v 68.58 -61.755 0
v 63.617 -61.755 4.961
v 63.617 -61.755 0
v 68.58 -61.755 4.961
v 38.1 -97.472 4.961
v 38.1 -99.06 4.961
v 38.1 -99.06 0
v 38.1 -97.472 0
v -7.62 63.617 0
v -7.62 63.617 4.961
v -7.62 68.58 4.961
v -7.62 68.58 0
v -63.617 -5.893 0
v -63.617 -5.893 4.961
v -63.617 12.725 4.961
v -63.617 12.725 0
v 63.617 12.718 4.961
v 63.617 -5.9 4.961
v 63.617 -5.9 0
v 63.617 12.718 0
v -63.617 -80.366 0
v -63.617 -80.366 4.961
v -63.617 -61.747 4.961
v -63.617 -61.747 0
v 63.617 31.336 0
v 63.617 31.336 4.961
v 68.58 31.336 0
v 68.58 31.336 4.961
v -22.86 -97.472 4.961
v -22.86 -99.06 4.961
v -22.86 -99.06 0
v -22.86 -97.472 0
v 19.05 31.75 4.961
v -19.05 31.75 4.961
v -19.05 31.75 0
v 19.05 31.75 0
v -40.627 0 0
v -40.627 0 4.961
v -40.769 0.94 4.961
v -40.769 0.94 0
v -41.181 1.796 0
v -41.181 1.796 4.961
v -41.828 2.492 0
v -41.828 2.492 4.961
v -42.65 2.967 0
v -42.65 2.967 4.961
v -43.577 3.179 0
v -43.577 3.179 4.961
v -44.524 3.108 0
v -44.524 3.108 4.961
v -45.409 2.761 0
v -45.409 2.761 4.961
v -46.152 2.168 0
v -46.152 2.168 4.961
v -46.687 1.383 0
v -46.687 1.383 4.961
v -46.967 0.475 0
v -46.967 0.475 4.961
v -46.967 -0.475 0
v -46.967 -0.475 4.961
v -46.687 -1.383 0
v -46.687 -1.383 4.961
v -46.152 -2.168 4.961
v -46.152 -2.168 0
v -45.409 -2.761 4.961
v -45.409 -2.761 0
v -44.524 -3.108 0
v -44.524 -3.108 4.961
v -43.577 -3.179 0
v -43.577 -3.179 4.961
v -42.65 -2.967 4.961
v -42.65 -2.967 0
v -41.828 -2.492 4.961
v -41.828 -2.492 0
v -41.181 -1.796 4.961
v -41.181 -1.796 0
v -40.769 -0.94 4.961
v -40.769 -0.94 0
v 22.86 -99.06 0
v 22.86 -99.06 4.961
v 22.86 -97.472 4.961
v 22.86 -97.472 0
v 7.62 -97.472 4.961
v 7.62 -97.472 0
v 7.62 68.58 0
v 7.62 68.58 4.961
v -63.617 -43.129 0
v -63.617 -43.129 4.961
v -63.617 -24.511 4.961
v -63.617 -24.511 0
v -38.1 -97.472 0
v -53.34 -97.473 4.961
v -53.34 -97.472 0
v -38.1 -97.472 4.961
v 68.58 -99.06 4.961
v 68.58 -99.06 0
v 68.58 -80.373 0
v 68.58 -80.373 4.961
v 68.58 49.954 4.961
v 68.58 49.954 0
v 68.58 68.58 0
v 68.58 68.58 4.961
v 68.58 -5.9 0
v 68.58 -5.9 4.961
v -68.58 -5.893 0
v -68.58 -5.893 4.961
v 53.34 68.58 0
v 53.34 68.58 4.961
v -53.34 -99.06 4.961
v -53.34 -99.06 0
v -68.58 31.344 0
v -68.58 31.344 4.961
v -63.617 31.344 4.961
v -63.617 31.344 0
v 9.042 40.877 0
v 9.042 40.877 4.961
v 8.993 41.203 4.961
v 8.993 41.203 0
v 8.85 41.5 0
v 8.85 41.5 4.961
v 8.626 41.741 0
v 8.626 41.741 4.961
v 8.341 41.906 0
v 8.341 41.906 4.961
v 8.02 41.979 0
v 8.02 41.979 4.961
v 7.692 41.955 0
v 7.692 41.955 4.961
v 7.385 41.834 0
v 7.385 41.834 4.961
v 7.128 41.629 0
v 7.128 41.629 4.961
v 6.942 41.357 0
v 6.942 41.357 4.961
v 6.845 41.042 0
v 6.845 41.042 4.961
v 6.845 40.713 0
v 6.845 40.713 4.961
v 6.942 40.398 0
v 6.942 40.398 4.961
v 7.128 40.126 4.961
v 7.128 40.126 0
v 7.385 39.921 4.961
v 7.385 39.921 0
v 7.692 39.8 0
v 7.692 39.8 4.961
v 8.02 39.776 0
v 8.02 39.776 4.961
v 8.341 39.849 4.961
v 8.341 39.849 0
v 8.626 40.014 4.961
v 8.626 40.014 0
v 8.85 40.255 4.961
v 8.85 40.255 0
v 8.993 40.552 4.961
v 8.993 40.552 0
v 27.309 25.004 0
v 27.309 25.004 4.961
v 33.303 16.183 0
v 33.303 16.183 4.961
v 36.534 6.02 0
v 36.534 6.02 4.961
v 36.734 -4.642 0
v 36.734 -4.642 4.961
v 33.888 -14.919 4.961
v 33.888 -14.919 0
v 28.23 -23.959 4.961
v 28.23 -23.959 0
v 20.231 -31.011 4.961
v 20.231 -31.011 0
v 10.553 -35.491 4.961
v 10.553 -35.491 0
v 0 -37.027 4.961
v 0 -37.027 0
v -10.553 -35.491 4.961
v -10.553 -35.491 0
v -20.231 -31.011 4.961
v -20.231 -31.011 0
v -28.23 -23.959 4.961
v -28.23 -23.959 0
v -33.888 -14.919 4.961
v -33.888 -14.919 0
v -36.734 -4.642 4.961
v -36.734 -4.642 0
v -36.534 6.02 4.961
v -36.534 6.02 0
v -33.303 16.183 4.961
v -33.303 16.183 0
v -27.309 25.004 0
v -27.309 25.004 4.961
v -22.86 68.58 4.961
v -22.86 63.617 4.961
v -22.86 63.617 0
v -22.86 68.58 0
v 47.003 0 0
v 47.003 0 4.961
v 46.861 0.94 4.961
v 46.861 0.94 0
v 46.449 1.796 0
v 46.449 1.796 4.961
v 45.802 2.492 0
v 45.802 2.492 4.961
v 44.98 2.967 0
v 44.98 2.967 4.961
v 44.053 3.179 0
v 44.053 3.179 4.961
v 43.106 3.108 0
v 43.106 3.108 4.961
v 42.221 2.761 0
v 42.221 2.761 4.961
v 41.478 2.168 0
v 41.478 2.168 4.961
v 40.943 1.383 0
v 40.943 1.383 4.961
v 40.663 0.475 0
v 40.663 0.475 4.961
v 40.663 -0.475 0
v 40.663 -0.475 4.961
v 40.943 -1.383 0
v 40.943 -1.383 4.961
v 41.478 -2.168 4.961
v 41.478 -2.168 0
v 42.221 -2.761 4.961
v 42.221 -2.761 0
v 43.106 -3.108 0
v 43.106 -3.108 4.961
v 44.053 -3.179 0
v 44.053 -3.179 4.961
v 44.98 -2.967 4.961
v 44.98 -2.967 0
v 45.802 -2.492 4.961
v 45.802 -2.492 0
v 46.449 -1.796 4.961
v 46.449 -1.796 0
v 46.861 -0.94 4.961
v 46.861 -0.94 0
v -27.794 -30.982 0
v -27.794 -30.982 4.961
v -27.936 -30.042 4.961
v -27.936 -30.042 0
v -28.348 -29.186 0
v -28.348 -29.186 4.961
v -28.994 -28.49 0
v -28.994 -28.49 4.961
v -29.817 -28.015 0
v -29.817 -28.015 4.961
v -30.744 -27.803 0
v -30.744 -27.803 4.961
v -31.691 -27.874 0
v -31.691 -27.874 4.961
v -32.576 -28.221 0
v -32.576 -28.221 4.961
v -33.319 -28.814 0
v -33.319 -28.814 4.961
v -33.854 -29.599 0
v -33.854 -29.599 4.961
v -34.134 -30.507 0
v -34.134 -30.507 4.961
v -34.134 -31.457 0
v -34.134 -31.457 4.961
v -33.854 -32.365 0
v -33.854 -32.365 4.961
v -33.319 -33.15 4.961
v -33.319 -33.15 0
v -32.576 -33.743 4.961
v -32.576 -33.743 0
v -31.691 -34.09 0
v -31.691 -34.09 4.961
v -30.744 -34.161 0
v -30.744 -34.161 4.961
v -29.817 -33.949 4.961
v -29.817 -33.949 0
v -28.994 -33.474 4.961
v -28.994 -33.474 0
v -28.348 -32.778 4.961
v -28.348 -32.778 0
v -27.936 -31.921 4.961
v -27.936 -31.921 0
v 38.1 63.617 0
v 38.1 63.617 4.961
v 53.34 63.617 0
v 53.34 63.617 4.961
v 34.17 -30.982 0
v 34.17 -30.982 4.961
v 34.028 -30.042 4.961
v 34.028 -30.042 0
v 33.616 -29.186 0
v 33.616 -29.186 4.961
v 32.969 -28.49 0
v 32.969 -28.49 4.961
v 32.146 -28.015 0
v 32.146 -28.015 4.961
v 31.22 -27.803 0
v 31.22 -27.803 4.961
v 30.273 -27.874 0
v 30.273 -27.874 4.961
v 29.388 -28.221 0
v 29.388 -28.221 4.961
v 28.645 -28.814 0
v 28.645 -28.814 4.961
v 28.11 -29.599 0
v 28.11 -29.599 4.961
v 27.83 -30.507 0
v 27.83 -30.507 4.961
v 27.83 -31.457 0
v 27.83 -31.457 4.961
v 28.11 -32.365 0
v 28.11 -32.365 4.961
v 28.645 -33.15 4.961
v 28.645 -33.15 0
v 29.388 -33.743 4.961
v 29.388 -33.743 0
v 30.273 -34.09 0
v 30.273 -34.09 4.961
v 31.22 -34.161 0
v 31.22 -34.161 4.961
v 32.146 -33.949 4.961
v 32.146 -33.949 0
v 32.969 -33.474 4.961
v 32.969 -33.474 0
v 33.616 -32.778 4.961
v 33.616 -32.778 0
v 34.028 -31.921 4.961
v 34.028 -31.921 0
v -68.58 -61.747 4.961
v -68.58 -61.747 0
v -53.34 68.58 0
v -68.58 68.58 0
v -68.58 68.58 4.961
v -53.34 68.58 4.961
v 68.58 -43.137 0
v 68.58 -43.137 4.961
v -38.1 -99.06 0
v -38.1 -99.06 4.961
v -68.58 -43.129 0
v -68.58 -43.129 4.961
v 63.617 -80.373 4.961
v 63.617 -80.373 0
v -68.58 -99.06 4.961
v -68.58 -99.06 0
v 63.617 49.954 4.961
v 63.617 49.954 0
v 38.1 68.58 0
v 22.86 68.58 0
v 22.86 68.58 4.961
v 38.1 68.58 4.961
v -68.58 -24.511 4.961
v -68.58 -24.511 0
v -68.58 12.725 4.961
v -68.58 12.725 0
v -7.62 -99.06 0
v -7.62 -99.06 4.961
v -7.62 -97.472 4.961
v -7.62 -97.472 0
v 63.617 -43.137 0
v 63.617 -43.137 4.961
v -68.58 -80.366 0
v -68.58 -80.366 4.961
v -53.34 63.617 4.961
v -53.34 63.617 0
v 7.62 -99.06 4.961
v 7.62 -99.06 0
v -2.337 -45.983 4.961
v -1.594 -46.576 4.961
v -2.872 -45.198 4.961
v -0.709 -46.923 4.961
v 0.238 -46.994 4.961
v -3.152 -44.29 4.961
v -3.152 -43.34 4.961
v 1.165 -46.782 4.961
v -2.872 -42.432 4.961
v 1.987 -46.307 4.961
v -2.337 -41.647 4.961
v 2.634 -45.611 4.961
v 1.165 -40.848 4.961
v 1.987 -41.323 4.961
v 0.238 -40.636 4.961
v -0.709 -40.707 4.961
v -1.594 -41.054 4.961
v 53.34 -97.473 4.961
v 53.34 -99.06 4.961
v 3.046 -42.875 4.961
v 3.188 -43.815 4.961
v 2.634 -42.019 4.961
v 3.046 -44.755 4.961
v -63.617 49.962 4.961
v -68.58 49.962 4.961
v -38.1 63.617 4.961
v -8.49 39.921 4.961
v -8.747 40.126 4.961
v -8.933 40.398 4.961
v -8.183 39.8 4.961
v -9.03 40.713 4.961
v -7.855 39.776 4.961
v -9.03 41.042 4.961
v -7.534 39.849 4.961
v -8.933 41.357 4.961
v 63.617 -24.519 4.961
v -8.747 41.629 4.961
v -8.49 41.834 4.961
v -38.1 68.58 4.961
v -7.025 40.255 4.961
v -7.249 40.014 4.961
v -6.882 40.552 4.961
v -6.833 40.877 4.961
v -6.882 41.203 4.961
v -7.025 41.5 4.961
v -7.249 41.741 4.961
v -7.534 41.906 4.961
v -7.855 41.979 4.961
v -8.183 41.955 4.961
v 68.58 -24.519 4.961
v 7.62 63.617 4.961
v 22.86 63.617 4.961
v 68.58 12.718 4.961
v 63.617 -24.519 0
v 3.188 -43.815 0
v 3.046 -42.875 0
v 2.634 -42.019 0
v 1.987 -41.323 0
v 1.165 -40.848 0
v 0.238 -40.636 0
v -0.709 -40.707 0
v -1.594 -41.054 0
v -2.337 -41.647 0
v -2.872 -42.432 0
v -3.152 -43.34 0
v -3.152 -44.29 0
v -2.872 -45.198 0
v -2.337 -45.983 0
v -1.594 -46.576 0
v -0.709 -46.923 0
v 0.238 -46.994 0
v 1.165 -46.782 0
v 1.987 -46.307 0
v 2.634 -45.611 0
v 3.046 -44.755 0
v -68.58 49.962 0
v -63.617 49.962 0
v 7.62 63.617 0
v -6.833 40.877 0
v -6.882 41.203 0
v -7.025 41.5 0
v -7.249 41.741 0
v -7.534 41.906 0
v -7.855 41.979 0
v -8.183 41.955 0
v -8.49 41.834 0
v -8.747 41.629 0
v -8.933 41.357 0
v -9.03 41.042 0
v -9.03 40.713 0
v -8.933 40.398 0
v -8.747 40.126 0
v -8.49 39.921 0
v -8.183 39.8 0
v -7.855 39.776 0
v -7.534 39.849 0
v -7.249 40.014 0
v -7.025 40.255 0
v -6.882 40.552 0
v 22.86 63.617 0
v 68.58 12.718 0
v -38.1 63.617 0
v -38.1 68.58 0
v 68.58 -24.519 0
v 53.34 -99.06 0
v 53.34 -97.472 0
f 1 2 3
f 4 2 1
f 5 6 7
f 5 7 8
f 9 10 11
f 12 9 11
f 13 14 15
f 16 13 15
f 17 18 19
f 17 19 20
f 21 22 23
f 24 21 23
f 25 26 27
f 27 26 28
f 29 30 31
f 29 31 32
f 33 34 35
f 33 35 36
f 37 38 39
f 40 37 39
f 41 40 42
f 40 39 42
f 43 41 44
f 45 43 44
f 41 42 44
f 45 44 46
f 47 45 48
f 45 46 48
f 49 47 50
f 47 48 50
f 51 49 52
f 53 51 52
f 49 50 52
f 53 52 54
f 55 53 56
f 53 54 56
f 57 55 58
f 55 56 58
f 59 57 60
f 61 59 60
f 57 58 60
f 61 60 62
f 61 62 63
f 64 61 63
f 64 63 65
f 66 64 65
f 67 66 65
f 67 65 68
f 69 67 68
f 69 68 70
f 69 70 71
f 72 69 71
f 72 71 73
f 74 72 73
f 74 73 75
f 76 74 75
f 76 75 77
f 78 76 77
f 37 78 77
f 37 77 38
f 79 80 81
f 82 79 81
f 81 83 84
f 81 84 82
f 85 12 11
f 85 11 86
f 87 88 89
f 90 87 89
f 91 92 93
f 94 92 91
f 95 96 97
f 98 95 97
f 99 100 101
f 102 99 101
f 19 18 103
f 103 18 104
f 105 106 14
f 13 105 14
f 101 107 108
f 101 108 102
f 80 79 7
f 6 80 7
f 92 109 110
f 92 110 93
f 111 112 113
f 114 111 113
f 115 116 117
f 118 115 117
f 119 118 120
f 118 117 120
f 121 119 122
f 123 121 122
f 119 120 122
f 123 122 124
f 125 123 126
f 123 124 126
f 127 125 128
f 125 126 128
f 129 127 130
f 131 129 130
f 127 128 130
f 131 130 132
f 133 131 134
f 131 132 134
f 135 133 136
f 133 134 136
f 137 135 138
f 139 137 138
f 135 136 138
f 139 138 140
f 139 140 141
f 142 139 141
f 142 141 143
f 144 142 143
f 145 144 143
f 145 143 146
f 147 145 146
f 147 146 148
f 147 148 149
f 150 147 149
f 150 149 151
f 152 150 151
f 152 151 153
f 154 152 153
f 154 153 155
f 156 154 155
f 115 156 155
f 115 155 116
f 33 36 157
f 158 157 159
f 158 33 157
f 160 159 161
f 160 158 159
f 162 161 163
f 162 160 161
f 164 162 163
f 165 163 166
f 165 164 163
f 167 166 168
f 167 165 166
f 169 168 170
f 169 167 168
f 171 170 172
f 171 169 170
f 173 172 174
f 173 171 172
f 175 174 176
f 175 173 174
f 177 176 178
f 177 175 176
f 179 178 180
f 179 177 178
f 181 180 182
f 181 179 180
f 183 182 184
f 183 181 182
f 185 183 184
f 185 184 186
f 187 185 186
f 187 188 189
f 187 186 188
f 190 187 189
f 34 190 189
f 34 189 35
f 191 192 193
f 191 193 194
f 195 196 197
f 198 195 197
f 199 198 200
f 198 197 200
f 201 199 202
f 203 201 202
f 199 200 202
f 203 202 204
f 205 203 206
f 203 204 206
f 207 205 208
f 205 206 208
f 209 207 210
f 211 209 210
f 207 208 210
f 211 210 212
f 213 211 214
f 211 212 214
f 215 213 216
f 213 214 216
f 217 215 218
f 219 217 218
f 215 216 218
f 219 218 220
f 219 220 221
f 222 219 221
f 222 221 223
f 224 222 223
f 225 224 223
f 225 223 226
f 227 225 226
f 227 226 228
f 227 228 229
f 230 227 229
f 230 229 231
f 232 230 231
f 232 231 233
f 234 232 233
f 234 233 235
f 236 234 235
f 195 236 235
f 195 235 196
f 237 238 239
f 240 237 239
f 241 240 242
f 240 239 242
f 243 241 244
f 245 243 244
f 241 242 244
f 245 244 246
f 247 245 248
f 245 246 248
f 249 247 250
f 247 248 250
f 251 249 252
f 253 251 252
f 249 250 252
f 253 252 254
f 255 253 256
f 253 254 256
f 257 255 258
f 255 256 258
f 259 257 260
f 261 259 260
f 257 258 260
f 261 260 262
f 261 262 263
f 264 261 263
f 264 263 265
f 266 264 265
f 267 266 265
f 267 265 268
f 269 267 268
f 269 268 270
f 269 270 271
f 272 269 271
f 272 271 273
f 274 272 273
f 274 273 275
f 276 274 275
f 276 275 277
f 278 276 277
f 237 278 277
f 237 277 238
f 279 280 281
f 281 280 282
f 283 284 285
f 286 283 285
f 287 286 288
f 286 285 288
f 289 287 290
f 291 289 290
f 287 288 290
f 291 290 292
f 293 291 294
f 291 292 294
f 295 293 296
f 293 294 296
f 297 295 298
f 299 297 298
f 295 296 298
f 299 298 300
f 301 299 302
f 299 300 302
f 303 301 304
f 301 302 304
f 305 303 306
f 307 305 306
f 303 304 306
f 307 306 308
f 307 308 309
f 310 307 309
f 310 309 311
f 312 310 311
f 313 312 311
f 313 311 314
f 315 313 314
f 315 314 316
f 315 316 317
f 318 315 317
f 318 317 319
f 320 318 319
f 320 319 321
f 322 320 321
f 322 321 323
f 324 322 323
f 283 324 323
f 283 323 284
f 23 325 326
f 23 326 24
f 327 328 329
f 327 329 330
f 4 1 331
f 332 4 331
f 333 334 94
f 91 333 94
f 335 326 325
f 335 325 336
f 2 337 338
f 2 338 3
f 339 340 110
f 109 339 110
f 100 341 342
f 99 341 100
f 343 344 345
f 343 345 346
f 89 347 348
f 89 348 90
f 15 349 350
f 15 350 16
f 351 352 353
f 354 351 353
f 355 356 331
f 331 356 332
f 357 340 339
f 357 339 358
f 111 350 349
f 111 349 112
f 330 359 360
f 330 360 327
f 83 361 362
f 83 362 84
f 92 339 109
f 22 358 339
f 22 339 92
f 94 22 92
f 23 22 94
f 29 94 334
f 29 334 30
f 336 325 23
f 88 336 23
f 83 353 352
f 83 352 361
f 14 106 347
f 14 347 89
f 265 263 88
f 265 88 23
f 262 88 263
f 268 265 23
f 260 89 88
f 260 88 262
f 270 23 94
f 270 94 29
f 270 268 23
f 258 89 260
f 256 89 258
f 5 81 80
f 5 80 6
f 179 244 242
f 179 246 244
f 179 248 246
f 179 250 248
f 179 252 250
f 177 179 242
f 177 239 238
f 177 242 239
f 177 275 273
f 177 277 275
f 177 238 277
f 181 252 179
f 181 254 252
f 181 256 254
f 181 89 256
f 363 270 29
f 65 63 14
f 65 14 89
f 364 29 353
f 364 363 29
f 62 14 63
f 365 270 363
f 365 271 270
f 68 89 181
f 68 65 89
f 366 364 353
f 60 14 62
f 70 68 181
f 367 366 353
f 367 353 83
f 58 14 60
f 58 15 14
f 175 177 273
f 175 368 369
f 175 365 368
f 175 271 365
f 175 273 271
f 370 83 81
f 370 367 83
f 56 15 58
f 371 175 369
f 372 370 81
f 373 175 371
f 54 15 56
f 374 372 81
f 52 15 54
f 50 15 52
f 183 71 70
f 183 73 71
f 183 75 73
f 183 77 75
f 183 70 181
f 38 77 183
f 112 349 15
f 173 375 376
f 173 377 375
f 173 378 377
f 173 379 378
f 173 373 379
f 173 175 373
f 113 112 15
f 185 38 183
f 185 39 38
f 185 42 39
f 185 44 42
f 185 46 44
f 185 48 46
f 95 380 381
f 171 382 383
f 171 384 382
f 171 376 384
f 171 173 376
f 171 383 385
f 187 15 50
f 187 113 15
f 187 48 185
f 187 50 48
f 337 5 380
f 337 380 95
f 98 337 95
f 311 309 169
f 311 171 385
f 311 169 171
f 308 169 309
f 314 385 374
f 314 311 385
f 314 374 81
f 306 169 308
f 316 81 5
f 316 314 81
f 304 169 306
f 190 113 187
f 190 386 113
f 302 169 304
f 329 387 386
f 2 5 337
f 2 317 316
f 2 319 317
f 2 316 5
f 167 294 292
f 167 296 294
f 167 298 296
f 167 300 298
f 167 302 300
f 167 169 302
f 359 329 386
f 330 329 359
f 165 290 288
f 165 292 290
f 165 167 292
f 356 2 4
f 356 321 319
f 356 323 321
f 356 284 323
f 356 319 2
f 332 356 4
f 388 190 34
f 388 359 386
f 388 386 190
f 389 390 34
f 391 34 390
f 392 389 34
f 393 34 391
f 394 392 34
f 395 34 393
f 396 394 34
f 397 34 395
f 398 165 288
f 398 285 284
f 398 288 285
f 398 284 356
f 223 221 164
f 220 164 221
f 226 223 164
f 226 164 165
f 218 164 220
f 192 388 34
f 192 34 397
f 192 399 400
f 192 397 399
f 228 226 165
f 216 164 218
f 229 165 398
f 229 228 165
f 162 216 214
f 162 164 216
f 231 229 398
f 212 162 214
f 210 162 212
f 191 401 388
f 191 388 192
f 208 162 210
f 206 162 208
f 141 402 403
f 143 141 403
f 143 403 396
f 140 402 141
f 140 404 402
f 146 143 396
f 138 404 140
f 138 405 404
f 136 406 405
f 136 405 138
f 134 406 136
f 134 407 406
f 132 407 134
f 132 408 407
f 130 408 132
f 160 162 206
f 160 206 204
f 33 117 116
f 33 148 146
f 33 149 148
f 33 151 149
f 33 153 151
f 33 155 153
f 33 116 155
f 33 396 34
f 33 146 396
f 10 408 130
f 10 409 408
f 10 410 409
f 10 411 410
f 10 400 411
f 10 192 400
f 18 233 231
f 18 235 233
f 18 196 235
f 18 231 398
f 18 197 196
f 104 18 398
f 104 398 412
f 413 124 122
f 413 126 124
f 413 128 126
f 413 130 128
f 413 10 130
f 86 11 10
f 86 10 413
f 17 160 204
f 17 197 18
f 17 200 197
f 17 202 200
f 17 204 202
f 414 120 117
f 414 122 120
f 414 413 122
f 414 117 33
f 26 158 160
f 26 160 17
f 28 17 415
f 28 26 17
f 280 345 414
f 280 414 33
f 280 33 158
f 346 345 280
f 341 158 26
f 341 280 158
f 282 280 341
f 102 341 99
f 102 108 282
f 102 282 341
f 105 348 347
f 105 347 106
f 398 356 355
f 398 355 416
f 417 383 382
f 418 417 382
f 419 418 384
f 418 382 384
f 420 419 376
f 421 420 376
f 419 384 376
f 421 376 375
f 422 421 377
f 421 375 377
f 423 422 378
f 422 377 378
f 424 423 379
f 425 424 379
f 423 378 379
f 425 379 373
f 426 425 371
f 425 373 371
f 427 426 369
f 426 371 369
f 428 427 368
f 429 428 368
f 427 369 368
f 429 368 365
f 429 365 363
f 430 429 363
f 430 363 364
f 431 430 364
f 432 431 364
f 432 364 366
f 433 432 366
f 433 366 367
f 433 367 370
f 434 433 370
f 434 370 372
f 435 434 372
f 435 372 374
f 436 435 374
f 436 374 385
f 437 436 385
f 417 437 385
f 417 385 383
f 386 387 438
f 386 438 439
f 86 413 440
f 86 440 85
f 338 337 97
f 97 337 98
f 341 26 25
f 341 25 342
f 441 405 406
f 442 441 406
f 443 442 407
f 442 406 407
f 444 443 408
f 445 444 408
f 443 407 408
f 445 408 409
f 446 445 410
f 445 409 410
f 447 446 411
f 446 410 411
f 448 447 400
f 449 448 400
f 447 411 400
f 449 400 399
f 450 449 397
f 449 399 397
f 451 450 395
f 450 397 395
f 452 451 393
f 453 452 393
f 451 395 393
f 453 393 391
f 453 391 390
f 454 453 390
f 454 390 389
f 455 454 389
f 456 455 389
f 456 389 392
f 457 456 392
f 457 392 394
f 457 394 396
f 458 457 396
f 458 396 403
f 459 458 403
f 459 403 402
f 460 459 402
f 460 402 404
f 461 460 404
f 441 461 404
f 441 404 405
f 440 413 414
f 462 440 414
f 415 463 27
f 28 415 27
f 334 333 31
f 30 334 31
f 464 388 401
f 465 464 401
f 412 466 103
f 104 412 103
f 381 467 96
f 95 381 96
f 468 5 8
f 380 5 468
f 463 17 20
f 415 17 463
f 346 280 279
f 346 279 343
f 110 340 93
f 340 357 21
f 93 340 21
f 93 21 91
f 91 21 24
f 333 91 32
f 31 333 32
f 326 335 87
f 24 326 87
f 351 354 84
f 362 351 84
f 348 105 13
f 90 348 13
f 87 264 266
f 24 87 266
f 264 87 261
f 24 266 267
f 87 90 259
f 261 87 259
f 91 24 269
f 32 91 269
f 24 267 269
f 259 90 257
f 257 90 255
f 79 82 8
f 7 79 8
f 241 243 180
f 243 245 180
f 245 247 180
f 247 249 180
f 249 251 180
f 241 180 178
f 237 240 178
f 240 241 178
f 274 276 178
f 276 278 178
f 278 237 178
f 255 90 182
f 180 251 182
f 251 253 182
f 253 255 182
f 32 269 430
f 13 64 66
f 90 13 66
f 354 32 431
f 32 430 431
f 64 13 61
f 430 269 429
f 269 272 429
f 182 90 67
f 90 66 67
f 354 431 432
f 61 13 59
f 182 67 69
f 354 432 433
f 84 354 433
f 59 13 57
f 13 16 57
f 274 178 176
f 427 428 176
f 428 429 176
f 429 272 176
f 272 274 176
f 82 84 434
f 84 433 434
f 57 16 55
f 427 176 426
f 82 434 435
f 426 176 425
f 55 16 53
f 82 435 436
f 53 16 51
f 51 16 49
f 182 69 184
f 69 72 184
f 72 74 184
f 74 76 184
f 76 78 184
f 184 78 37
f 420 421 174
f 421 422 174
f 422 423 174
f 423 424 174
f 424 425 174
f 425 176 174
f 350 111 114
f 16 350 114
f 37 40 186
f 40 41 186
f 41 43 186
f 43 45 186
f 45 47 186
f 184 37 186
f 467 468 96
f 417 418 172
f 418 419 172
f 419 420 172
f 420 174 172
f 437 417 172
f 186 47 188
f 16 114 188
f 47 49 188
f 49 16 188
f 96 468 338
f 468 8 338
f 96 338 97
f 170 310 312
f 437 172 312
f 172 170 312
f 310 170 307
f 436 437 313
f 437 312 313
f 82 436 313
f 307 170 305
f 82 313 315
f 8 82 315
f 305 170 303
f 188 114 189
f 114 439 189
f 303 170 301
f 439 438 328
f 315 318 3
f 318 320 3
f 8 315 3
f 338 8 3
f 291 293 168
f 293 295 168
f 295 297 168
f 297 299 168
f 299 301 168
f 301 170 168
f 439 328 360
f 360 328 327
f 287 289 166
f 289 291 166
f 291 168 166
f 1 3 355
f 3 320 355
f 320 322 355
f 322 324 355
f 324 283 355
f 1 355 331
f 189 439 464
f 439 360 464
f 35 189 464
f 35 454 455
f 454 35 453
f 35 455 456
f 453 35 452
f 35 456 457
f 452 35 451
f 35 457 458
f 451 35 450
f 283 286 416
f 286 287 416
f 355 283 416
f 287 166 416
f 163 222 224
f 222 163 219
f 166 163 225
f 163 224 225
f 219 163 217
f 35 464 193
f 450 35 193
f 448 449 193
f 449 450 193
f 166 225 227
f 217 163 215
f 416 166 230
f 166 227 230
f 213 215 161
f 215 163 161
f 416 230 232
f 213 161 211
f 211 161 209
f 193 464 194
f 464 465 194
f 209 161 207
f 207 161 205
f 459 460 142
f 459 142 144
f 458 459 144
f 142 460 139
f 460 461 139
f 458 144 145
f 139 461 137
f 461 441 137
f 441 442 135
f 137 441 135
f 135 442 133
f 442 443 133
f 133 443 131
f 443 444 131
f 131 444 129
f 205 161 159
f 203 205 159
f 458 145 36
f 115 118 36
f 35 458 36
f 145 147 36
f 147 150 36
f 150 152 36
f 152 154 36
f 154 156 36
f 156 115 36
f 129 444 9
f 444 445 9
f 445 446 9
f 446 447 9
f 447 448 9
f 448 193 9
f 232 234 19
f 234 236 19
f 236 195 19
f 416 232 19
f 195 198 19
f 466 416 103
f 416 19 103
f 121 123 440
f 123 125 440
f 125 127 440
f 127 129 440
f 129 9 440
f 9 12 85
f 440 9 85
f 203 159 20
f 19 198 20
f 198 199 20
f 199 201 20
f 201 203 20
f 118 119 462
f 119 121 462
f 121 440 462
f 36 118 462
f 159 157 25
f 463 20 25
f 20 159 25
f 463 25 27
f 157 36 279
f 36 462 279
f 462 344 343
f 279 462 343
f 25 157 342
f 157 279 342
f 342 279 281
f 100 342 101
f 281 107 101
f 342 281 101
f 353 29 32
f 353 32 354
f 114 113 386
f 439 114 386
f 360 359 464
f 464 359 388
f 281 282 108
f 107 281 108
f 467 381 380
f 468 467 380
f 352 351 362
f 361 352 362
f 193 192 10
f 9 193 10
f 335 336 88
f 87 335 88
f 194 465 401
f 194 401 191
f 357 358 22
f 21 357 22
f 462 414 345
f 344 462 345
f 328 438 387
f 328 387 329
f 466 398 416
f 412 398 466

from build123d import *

# Parameters (mm, degrees)
SKETCH1_W           = 137.16
SKETCH1_H           = 167.64
BOSS_EXTRUDE1_DEPTH = 4.9609375
CUT_EXTRUDE1_DEPTH  = 5.9609375
SKETCH4_R           = 3.1877
CUT_EXTRUDE2_DEPTH  = 5.9609375
SKETCH6_W           = 4.9634902
SKETCH6_H           = 18.6182
SKETCH6_W_2         = 15.24
SKETCH6_H_2         = 4.9634902
SKETCH6_H_3         = 1.5875
CUT_EXTRUDE5_DEPTH  = 5.9609375
SKETCH7_OUTSIDE_W   = 182.492
SKETCH7_OUTSIDE_H   = 212.972
SKETCH7_OUTSIDE_R   = 1.1049
CUT_EXTRUDE6_DEPTH  = 5.9609375


with BuildPart() as part:
    # Sketch1 → Boss-Extrude1 (new body)
    with BuildSketch(Plane.XY):
        with Locations((0, -15.24)):
            Rectangle(SKETCH1_W, SKETCH1_H)
    extrude(amount=BOSS_EXTRUDE1_DEPTH)

    # Sketch2 → Cut-Extrude1 (cut, through all)
    with BuildSketch(Plane.XY.offset(4.9609375)):
        with BuildLine():
            Line((-19.05, 31.75), (19.05, 31.75))
            ThreePointArc((19.05, 31.75), (0, -37.026544532), (-19.05, 31.75))
        make_face()
    extrude(amount=-CUT_EXTRUDE1_DEPTH, mode=Mode.SUBTRACT)

    # Sketch4 → Cut-Extrude2 (cut, through all)
    with BuildSketch(Plane.XY.offset(4.9609375)):
        with Locations((-43.815, 0)):
            Circle(SKETCH4_R)
        with Locations((-30.981883618, -30.981883618)):
            Circle(SKETCH4_R)
        with Locations((0, -43.815)):
            Circle(SKETCH4_R)
        with Locations((30.981883618, -30.981883618)):
            Circle(SKETCH4_R)
        with Locations((43.815, 0)):
            Circle(SKETCH4_R)
    extrude(amount=-CUT_EXTRUDE2_DEPTH, mode=Mode.SUBTRACT)

    # Sketch6 → Cut-Extrude5 (cut, through all)
    with BuildSketch(Plane.XY.offset(4.9609375)):
        with Locations((-66.0982549, 3.4163)):
            Rectangle(SKETCH6_W, SKETCH6_H)
        with Locations((-66.0982549, 40.6527)):
            Rectangle(SKETCH6_W, SKETCH6_H)
        with Locations((-66.0982549, -33.8201)):
            Rectangle(SKETCH6_W, SKETCH6_H)
        with Locations((-66.0982549, -71.0565)):
            Rectangle(SKETCH6_W, SKETCH6_H)
        with Locations((66.0982549, 3.40868)):
            Rectangle(SKETCH6_W, SKETCH6_H)
        with Locations((66.0982549, 40.64508)):
            Rectangle(SKETCH6_W, SKETCH6_H)
        with Locations((66.0982549, -33.82772)):
            Rectangle(SKETCH6_W, SKETCH6_H)
        with Locations((66.0982549, -71.06412)):
            Rectangle(SKETCH6_W, SKETCH6_H)
        with Locations((-15.24, 66.0982549)):
            Rectangle(SKETCH6_W_2, SKETCH6_H_2)
        with Locations((-45.72, 66.0982549)):
            Rectangle(SKETCH6_W_2, SKETCH6_H_2)
        with Locations((15.24, 66.0982549)):
            Rectangle(SKETCH6_W_2, SKETCH6_H_2)
        with Locations((45.72, 66.0982549)):
            Rectangle(SKETCH6_W_2, SKETCH6_H_2)
        with Locations((-15.24, -98.26625)):
            Rectangle(SKETCH6_W_2, SKETCH6_H_3)
        with Locations((-45.72, -98.26625)):
            Rectangle(SKETCH6_W_2, SKETCH6_H_3)
        with Locations((15.24, -98.26625)):
            Rectangle(SKETCH6_W_2, SKETCH6_H_3)
        with Locations((45.72, -98.26625)):
            Rectangle(SKETCH6_W_2, SKETCH6_H_3)
    extrude(amount=-CUT_EXTRUDE5_DEPTH, mode=Mode.SUBTRACT)

    # Sketch7 outside → Cut-Extrude6 (cut, through all)
    with BuildSketch(Plane.XY.offset(4.9609375)):
        with Locations((0, -15.24)):
            Rectangle(SKETCH7_OUTSIDE_W, SKETCH7_OUTSIDE_H)
        Polygon((-63.6165098, 49.9618), (-63.6165098, 31.3436), (-68.58, 31.3436), (-68.58, 12.7254), (-63.6165098, 12.7254), (-63.6165098, -5.8928), (-68.58, -5.8928), (-68.58, -24.511), (-63.6165098, -24.511), (-63.6165098, -43.1292), (-68.58, -43.1292), (-68.58, -61.7474), (-63.6165098, -61.7474), (-63.6165098, -80.3656), (-68.58, -80.3656), (-68.58, -99.06), (-53.34, -99.06), (-53.34, -97.4725), (-38.1, -97.4725), (-38.1, -99.06), (-22.86, -99.06), (-22.86, -97.4725), (-7.62, -97.4725), (-7.62, -99.06), (7.62, -99.06), (7.62, -97.4725), (22.86, -97.4725), (22.86, -99.06), (38.1, -99.06), (38.1, -97.4725), (53.34, -97.4725), (53.34, -99.06), (68.58, -99.06), (68.58, -80.37322), (63.6165098, -80.37322), (63.6165098, -61.75502), (68.58, -61.75502), (68.58, -43.13682), (63.6165098, -43.13682), (63.6165098, -24.51862), (68.58, -24.51862), (68.58, -5.90042), (63.6165098, -5.90042), (63.6165098, 12.71778), (68.58, 12.71778), (68.58, 31.33598), (63.6165098, 31.33598), (63.6165098, 49.95418), (68.58, 49.95418), (68.58, 68.58), (53.34, 68.58), (53.34, 63.6165098), (38.1, 63.6165098), (38.1, 68.58), (22.86, 68.58), (22.86, 63.6165098), (7.62, 63.6165098), (7.62, 68.58), (-7.62, 68.58), (-7.62, 63.6165098), (-22.86, 63.6165098), (-22.86, 68.58), (-38.1, 68.58), (-38.1, 63.6165098), (-53.34, 63.6165098), (-53.34, 68.58), (-68.58, 68.58), (-68.58, 49.9618), align=None, mode=Mode.SUBTRACT)
        with Locations((-7.9375, 40.87749)):
            Circle(SKETCH7_OUTSIDE_R)
        with Locations((7.9375, 40.87749)):
            Circle(SKETCH7_OUTSIDE_R)
    extrude(amount=-CUT_EXTRUDE6_DEPTH, mode=Mode.SUBTRACT)


solid = part.part
